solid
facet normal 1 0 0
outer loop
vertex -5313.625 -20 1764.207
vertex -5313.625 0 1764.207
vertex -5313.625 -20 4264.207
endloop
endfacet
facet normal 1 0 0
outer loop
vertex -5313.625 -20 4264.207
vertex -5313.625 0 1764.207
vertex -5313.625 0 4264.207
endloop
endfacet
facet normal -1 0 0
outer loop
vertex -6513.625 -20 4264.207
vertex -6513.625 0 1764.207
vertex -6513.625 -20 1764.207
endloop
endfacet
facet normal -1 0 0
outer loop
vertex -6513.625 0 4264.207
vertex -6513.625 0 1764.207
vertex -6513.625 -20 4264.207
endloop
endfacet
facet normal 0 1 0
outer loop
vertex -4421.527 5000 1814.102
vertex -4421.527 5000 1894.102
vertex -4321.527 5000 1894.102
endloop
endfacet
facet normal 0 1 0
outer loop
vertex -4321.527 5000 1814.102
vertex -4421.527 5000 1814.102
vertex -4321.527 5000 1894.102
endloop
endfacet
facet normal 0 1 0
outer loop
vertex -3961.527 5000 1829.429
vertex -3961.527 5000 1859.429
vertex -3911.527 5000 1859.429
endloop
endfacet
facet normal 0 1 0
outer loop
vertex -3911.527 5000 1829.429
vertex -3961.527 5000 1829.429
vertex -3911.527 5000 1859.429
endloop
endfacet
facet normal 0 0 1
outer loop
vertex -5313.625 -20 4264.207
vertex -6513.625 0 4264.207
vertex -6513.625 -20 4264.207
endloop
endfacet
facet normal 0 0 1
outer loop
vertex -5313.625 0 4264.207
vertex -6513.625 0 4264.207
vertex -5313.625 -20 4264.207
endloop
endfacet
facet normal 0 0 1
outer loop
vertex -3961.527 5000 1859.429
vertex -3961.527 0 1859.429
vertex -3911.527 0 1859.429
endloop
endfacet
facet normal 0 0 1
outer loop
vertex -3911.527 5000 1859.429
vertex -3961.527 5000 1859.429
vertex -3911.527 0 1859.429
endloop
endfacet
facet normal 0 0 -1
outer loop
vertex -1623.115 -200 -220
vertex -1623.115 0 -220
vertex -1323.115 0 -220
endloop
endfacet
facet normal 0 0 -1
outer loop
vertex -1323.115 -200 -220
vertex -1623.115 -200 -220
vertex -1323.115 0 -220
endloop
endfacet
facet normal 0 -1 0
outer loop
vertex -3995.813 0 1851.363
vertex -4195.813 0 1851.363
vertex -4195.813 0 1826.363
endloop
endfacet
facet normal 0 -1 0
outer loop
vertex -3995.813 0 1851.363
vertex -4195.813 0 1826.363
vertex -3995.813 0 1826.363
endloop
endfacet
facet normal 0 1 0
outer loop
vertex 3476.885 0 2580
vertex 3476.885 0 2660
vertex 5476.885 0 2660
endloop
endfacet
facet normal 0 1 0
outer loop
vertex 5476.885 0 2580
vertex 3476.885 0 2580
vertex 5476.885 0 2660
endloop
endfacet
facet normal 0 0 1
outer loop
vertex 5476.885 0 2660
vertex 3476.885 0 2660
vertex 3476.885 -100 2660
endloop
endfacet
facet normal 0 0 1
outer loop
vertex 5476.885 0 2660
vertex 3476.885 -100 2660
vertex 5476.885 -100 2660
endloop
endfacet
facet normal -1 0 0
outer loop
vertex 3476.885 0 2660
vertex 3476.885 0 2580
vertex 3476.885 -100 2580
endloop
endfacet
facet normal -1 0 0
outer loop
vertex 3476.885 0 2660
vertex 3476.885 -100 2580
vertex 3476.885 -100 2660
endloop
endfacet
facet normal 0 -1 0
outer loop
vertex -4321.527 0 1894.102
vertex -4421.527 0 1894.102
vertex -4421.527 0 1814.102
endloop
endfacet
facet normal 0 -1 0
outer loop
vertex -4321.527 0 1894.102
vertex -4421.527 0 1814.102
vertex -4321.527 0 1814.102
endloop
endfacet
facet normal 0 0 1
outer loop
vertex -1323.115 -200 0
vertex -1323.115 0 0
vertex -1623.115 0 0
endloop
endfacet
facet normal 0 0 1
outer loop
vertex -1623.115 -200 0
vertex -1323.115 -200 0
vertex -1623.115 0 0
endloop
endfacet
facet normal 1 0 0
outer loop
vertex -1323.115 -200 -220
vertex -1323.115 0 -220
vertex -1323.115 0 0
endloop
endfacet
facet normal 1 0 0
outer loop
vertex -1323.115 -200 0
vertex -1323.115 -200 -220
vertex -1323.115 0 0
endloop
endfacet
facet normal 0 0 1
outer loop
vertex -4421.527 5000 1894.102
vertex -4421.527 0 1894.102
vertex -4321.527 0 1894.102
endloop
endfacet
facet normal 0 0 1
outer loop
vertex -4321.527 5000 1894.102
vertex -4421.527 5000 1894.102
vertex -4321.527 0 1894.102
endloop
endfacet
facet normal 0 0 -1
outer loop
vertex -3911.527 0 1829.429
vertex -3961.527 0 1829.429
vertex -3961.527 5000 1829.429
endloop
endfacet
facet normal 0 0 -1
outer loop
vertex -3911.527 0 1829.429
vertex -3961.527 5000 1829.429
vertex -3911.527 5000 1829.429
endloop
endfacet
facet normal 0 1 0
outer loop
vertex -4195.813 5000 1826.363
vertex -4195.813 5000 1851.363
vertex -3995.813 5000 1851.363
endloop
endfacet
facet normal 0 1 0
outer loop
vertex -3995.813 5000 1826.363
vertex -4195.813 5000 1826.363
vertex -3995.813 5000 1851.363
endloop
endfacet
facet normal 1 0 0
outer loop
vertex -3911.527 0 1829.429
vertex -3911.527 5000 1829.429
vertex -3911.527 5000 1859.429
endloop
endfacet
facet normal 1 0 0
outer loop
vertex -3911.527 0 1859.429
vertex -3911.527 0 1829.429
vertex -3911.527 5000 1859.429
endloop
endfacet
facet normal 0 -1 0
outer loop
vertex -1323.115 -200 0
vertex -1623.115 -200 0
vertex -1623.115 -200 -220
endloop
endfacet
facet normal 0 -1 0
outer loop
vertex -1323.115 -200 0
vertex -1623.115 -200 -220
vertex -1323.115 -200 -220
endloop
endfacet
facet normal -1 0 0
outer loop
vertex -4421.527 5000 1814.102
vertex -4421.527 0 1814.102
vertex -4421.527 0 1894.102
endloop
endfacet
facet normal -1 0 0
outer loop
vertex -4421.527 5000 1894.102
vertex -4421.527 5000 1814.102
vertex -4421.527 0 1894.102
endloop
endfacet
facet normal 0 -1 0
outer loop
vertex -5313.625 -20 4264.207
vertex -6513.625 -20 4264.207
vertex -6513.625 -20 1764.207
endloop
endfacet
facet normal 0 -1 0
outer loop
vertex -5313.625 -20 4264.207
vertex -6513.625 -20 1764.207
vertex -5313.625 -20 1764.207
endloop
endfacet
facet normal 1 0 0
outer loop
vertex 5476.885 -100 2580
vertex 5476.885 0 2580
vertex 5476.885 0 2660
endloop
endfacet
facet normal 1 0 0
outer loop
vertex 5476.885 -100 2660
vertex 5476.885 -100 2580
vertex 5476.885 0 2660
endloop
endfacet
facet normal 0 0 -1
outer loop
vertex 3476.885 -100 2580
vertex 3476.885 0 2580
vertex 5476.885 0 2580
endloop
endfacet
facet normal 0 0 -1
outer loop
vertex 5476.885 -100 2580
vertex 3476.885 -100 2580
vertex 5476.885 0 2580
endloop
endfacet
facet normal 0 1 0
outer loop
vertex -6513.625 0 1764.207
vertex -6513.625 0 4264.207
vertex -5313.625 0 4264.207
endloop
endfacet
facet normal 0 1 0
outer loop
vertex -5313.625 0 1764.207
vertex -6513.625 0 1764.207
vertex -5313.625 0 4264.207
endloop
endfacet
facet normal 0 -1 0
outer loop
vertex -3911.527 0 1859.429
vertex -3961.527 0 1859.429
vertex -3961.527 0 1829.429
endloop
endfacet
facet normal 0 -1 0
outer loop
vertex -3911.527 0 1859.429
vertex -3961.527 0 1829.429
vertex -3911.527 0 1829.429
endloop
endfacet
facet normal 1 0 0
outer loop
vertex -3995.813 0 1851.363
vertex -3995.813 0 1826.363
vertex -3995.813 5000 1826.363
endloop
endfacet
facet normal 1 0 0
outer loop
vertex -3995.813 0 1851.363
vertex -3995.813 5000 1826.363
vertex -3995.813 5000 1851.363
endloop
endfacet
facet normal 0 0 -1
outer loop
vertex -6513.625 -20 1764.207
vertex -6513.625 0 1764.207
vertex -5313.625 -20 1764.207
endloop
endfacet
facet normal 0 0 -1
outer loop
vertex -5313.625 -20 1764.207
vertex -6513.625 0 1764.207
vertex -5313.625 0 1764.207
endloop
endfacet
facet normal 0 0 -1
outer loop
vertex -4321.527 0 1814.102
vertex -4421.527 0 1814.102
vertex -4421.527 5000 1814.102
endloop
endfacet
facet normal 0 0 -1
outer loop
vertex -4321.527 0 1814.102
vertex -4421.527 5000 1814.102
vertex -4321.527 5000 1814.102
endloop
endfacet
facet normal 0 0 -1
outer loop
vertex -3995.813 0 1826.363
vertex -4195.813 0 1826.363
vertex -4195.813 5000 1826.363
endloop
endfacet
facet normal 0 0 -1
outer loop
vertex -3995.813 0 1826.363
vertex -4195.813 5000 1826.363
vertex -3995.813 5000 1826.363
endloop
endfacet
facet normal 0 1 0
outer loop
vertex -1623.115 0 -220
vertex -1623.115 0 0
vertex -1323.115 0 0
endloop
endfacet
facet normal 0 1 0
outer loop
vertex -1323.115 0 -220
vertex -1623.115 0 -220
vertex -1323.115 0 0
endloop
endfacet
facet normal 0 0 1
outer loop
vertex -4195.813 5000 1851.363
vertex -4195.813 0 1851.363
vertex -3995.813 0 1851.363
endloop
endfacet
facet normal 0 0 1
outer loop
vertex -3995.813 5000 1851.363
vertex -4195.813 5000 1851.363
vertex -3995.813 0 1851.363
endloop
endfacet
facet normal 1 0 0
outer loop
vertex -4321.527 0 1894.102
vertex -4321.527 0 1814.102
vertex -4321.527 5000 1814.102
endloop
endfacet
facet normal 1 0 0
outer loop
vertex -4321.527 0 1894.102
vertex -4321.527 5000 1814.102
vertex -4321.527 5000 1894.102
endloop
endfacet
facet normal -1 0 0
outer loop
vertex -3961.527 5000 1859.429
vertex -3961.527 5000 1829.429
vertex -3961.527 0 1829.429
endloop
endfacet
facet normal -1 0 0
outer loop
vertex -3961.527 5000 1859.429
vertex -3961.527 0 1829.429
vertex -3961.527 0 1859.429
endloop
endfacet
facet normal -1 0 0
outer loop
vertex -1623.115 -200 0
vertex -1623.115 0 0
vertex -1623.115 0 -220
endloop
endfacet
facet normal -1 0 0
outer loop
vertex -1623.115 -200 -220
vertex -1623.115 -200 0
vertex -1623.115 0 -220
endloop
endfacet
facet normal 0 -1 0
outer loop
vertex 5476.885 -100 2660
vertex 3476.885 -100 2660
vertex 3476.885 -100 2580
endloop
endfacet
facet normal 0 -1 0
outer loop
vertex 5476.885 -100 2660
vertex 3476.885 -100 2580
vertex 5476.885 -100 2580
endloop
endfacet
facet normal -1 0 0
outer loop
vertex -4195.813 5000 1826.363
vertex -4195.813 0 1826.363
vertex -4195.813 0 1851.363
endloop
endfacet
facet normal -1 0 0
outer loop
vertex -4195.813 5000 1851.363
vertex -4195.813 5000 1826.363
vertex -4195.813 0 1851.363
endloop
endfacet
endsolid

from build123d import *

# Parameters (mm, degrees)
F2_W     = 100
F2_H     = 80
F2_W_2   = 200
F2_H_2   = 25
F2_W_3   = 50
F2_H_3   = 30
F3_DEPTH = 5000
F1_W     = 2000
F1_H     = 80
F4_DEPTH = 100
F5_DEPTH = 200
F2_W_4   = 1200
F2_H_4   = 2500
F6_DEPTH = 20


with BuildPart() as f3:
    # F2 (on Front) → F3 (new body)
    with BuildSketch(Plane.XZ):
        with Locations((-4371.527469, 1854.102281)):
            Rectangle(F2_W, F2_H)
        with Locations((-4095.813154, 1838.863437)):
            Rectangle(F2_W_2, F2_H_2)
        with Locations((-3936.527457, 1844.42879)):
            Rectangle(F2_W_3, F2_H_3)
    extrude(amount=-F3_DEPTH)


with BuildPart() as f4:
    # F1 (on Front) → F4 (new body)
    with BuildSketch(Plane.XZ):
        with Locations((4476.884699, 2620)):
            Rectangle(F1_W, F1_H)
    extrude(amount=F4_DEPTH)


with BuildPart() as f5:
    # F1 (on Front) → F5 (new body)
    with BuildSketch(Plane.XZ):
        Polygon((-1523.115301, 0), (-1623.115301, 0), (-1623.115301, -220), (-1323.115301, -220), (-1323.115301, 0), (-1423.115301, 0), align=None)
    extrude(amount=F5_DEPTH)


with BuildPart() as f6:
    # F2 (on Front) → F6 (new body)
    with BuildSketch(Plane.XZ):
        with Locations((-5913.625145, 3014.206886)):
            Rectangle(F2_W_4, F2_H_4)
    extrude(amount=F6_DEPTH)


solid = Compound([f3.part, f4.part, f5.part, f6.part])
